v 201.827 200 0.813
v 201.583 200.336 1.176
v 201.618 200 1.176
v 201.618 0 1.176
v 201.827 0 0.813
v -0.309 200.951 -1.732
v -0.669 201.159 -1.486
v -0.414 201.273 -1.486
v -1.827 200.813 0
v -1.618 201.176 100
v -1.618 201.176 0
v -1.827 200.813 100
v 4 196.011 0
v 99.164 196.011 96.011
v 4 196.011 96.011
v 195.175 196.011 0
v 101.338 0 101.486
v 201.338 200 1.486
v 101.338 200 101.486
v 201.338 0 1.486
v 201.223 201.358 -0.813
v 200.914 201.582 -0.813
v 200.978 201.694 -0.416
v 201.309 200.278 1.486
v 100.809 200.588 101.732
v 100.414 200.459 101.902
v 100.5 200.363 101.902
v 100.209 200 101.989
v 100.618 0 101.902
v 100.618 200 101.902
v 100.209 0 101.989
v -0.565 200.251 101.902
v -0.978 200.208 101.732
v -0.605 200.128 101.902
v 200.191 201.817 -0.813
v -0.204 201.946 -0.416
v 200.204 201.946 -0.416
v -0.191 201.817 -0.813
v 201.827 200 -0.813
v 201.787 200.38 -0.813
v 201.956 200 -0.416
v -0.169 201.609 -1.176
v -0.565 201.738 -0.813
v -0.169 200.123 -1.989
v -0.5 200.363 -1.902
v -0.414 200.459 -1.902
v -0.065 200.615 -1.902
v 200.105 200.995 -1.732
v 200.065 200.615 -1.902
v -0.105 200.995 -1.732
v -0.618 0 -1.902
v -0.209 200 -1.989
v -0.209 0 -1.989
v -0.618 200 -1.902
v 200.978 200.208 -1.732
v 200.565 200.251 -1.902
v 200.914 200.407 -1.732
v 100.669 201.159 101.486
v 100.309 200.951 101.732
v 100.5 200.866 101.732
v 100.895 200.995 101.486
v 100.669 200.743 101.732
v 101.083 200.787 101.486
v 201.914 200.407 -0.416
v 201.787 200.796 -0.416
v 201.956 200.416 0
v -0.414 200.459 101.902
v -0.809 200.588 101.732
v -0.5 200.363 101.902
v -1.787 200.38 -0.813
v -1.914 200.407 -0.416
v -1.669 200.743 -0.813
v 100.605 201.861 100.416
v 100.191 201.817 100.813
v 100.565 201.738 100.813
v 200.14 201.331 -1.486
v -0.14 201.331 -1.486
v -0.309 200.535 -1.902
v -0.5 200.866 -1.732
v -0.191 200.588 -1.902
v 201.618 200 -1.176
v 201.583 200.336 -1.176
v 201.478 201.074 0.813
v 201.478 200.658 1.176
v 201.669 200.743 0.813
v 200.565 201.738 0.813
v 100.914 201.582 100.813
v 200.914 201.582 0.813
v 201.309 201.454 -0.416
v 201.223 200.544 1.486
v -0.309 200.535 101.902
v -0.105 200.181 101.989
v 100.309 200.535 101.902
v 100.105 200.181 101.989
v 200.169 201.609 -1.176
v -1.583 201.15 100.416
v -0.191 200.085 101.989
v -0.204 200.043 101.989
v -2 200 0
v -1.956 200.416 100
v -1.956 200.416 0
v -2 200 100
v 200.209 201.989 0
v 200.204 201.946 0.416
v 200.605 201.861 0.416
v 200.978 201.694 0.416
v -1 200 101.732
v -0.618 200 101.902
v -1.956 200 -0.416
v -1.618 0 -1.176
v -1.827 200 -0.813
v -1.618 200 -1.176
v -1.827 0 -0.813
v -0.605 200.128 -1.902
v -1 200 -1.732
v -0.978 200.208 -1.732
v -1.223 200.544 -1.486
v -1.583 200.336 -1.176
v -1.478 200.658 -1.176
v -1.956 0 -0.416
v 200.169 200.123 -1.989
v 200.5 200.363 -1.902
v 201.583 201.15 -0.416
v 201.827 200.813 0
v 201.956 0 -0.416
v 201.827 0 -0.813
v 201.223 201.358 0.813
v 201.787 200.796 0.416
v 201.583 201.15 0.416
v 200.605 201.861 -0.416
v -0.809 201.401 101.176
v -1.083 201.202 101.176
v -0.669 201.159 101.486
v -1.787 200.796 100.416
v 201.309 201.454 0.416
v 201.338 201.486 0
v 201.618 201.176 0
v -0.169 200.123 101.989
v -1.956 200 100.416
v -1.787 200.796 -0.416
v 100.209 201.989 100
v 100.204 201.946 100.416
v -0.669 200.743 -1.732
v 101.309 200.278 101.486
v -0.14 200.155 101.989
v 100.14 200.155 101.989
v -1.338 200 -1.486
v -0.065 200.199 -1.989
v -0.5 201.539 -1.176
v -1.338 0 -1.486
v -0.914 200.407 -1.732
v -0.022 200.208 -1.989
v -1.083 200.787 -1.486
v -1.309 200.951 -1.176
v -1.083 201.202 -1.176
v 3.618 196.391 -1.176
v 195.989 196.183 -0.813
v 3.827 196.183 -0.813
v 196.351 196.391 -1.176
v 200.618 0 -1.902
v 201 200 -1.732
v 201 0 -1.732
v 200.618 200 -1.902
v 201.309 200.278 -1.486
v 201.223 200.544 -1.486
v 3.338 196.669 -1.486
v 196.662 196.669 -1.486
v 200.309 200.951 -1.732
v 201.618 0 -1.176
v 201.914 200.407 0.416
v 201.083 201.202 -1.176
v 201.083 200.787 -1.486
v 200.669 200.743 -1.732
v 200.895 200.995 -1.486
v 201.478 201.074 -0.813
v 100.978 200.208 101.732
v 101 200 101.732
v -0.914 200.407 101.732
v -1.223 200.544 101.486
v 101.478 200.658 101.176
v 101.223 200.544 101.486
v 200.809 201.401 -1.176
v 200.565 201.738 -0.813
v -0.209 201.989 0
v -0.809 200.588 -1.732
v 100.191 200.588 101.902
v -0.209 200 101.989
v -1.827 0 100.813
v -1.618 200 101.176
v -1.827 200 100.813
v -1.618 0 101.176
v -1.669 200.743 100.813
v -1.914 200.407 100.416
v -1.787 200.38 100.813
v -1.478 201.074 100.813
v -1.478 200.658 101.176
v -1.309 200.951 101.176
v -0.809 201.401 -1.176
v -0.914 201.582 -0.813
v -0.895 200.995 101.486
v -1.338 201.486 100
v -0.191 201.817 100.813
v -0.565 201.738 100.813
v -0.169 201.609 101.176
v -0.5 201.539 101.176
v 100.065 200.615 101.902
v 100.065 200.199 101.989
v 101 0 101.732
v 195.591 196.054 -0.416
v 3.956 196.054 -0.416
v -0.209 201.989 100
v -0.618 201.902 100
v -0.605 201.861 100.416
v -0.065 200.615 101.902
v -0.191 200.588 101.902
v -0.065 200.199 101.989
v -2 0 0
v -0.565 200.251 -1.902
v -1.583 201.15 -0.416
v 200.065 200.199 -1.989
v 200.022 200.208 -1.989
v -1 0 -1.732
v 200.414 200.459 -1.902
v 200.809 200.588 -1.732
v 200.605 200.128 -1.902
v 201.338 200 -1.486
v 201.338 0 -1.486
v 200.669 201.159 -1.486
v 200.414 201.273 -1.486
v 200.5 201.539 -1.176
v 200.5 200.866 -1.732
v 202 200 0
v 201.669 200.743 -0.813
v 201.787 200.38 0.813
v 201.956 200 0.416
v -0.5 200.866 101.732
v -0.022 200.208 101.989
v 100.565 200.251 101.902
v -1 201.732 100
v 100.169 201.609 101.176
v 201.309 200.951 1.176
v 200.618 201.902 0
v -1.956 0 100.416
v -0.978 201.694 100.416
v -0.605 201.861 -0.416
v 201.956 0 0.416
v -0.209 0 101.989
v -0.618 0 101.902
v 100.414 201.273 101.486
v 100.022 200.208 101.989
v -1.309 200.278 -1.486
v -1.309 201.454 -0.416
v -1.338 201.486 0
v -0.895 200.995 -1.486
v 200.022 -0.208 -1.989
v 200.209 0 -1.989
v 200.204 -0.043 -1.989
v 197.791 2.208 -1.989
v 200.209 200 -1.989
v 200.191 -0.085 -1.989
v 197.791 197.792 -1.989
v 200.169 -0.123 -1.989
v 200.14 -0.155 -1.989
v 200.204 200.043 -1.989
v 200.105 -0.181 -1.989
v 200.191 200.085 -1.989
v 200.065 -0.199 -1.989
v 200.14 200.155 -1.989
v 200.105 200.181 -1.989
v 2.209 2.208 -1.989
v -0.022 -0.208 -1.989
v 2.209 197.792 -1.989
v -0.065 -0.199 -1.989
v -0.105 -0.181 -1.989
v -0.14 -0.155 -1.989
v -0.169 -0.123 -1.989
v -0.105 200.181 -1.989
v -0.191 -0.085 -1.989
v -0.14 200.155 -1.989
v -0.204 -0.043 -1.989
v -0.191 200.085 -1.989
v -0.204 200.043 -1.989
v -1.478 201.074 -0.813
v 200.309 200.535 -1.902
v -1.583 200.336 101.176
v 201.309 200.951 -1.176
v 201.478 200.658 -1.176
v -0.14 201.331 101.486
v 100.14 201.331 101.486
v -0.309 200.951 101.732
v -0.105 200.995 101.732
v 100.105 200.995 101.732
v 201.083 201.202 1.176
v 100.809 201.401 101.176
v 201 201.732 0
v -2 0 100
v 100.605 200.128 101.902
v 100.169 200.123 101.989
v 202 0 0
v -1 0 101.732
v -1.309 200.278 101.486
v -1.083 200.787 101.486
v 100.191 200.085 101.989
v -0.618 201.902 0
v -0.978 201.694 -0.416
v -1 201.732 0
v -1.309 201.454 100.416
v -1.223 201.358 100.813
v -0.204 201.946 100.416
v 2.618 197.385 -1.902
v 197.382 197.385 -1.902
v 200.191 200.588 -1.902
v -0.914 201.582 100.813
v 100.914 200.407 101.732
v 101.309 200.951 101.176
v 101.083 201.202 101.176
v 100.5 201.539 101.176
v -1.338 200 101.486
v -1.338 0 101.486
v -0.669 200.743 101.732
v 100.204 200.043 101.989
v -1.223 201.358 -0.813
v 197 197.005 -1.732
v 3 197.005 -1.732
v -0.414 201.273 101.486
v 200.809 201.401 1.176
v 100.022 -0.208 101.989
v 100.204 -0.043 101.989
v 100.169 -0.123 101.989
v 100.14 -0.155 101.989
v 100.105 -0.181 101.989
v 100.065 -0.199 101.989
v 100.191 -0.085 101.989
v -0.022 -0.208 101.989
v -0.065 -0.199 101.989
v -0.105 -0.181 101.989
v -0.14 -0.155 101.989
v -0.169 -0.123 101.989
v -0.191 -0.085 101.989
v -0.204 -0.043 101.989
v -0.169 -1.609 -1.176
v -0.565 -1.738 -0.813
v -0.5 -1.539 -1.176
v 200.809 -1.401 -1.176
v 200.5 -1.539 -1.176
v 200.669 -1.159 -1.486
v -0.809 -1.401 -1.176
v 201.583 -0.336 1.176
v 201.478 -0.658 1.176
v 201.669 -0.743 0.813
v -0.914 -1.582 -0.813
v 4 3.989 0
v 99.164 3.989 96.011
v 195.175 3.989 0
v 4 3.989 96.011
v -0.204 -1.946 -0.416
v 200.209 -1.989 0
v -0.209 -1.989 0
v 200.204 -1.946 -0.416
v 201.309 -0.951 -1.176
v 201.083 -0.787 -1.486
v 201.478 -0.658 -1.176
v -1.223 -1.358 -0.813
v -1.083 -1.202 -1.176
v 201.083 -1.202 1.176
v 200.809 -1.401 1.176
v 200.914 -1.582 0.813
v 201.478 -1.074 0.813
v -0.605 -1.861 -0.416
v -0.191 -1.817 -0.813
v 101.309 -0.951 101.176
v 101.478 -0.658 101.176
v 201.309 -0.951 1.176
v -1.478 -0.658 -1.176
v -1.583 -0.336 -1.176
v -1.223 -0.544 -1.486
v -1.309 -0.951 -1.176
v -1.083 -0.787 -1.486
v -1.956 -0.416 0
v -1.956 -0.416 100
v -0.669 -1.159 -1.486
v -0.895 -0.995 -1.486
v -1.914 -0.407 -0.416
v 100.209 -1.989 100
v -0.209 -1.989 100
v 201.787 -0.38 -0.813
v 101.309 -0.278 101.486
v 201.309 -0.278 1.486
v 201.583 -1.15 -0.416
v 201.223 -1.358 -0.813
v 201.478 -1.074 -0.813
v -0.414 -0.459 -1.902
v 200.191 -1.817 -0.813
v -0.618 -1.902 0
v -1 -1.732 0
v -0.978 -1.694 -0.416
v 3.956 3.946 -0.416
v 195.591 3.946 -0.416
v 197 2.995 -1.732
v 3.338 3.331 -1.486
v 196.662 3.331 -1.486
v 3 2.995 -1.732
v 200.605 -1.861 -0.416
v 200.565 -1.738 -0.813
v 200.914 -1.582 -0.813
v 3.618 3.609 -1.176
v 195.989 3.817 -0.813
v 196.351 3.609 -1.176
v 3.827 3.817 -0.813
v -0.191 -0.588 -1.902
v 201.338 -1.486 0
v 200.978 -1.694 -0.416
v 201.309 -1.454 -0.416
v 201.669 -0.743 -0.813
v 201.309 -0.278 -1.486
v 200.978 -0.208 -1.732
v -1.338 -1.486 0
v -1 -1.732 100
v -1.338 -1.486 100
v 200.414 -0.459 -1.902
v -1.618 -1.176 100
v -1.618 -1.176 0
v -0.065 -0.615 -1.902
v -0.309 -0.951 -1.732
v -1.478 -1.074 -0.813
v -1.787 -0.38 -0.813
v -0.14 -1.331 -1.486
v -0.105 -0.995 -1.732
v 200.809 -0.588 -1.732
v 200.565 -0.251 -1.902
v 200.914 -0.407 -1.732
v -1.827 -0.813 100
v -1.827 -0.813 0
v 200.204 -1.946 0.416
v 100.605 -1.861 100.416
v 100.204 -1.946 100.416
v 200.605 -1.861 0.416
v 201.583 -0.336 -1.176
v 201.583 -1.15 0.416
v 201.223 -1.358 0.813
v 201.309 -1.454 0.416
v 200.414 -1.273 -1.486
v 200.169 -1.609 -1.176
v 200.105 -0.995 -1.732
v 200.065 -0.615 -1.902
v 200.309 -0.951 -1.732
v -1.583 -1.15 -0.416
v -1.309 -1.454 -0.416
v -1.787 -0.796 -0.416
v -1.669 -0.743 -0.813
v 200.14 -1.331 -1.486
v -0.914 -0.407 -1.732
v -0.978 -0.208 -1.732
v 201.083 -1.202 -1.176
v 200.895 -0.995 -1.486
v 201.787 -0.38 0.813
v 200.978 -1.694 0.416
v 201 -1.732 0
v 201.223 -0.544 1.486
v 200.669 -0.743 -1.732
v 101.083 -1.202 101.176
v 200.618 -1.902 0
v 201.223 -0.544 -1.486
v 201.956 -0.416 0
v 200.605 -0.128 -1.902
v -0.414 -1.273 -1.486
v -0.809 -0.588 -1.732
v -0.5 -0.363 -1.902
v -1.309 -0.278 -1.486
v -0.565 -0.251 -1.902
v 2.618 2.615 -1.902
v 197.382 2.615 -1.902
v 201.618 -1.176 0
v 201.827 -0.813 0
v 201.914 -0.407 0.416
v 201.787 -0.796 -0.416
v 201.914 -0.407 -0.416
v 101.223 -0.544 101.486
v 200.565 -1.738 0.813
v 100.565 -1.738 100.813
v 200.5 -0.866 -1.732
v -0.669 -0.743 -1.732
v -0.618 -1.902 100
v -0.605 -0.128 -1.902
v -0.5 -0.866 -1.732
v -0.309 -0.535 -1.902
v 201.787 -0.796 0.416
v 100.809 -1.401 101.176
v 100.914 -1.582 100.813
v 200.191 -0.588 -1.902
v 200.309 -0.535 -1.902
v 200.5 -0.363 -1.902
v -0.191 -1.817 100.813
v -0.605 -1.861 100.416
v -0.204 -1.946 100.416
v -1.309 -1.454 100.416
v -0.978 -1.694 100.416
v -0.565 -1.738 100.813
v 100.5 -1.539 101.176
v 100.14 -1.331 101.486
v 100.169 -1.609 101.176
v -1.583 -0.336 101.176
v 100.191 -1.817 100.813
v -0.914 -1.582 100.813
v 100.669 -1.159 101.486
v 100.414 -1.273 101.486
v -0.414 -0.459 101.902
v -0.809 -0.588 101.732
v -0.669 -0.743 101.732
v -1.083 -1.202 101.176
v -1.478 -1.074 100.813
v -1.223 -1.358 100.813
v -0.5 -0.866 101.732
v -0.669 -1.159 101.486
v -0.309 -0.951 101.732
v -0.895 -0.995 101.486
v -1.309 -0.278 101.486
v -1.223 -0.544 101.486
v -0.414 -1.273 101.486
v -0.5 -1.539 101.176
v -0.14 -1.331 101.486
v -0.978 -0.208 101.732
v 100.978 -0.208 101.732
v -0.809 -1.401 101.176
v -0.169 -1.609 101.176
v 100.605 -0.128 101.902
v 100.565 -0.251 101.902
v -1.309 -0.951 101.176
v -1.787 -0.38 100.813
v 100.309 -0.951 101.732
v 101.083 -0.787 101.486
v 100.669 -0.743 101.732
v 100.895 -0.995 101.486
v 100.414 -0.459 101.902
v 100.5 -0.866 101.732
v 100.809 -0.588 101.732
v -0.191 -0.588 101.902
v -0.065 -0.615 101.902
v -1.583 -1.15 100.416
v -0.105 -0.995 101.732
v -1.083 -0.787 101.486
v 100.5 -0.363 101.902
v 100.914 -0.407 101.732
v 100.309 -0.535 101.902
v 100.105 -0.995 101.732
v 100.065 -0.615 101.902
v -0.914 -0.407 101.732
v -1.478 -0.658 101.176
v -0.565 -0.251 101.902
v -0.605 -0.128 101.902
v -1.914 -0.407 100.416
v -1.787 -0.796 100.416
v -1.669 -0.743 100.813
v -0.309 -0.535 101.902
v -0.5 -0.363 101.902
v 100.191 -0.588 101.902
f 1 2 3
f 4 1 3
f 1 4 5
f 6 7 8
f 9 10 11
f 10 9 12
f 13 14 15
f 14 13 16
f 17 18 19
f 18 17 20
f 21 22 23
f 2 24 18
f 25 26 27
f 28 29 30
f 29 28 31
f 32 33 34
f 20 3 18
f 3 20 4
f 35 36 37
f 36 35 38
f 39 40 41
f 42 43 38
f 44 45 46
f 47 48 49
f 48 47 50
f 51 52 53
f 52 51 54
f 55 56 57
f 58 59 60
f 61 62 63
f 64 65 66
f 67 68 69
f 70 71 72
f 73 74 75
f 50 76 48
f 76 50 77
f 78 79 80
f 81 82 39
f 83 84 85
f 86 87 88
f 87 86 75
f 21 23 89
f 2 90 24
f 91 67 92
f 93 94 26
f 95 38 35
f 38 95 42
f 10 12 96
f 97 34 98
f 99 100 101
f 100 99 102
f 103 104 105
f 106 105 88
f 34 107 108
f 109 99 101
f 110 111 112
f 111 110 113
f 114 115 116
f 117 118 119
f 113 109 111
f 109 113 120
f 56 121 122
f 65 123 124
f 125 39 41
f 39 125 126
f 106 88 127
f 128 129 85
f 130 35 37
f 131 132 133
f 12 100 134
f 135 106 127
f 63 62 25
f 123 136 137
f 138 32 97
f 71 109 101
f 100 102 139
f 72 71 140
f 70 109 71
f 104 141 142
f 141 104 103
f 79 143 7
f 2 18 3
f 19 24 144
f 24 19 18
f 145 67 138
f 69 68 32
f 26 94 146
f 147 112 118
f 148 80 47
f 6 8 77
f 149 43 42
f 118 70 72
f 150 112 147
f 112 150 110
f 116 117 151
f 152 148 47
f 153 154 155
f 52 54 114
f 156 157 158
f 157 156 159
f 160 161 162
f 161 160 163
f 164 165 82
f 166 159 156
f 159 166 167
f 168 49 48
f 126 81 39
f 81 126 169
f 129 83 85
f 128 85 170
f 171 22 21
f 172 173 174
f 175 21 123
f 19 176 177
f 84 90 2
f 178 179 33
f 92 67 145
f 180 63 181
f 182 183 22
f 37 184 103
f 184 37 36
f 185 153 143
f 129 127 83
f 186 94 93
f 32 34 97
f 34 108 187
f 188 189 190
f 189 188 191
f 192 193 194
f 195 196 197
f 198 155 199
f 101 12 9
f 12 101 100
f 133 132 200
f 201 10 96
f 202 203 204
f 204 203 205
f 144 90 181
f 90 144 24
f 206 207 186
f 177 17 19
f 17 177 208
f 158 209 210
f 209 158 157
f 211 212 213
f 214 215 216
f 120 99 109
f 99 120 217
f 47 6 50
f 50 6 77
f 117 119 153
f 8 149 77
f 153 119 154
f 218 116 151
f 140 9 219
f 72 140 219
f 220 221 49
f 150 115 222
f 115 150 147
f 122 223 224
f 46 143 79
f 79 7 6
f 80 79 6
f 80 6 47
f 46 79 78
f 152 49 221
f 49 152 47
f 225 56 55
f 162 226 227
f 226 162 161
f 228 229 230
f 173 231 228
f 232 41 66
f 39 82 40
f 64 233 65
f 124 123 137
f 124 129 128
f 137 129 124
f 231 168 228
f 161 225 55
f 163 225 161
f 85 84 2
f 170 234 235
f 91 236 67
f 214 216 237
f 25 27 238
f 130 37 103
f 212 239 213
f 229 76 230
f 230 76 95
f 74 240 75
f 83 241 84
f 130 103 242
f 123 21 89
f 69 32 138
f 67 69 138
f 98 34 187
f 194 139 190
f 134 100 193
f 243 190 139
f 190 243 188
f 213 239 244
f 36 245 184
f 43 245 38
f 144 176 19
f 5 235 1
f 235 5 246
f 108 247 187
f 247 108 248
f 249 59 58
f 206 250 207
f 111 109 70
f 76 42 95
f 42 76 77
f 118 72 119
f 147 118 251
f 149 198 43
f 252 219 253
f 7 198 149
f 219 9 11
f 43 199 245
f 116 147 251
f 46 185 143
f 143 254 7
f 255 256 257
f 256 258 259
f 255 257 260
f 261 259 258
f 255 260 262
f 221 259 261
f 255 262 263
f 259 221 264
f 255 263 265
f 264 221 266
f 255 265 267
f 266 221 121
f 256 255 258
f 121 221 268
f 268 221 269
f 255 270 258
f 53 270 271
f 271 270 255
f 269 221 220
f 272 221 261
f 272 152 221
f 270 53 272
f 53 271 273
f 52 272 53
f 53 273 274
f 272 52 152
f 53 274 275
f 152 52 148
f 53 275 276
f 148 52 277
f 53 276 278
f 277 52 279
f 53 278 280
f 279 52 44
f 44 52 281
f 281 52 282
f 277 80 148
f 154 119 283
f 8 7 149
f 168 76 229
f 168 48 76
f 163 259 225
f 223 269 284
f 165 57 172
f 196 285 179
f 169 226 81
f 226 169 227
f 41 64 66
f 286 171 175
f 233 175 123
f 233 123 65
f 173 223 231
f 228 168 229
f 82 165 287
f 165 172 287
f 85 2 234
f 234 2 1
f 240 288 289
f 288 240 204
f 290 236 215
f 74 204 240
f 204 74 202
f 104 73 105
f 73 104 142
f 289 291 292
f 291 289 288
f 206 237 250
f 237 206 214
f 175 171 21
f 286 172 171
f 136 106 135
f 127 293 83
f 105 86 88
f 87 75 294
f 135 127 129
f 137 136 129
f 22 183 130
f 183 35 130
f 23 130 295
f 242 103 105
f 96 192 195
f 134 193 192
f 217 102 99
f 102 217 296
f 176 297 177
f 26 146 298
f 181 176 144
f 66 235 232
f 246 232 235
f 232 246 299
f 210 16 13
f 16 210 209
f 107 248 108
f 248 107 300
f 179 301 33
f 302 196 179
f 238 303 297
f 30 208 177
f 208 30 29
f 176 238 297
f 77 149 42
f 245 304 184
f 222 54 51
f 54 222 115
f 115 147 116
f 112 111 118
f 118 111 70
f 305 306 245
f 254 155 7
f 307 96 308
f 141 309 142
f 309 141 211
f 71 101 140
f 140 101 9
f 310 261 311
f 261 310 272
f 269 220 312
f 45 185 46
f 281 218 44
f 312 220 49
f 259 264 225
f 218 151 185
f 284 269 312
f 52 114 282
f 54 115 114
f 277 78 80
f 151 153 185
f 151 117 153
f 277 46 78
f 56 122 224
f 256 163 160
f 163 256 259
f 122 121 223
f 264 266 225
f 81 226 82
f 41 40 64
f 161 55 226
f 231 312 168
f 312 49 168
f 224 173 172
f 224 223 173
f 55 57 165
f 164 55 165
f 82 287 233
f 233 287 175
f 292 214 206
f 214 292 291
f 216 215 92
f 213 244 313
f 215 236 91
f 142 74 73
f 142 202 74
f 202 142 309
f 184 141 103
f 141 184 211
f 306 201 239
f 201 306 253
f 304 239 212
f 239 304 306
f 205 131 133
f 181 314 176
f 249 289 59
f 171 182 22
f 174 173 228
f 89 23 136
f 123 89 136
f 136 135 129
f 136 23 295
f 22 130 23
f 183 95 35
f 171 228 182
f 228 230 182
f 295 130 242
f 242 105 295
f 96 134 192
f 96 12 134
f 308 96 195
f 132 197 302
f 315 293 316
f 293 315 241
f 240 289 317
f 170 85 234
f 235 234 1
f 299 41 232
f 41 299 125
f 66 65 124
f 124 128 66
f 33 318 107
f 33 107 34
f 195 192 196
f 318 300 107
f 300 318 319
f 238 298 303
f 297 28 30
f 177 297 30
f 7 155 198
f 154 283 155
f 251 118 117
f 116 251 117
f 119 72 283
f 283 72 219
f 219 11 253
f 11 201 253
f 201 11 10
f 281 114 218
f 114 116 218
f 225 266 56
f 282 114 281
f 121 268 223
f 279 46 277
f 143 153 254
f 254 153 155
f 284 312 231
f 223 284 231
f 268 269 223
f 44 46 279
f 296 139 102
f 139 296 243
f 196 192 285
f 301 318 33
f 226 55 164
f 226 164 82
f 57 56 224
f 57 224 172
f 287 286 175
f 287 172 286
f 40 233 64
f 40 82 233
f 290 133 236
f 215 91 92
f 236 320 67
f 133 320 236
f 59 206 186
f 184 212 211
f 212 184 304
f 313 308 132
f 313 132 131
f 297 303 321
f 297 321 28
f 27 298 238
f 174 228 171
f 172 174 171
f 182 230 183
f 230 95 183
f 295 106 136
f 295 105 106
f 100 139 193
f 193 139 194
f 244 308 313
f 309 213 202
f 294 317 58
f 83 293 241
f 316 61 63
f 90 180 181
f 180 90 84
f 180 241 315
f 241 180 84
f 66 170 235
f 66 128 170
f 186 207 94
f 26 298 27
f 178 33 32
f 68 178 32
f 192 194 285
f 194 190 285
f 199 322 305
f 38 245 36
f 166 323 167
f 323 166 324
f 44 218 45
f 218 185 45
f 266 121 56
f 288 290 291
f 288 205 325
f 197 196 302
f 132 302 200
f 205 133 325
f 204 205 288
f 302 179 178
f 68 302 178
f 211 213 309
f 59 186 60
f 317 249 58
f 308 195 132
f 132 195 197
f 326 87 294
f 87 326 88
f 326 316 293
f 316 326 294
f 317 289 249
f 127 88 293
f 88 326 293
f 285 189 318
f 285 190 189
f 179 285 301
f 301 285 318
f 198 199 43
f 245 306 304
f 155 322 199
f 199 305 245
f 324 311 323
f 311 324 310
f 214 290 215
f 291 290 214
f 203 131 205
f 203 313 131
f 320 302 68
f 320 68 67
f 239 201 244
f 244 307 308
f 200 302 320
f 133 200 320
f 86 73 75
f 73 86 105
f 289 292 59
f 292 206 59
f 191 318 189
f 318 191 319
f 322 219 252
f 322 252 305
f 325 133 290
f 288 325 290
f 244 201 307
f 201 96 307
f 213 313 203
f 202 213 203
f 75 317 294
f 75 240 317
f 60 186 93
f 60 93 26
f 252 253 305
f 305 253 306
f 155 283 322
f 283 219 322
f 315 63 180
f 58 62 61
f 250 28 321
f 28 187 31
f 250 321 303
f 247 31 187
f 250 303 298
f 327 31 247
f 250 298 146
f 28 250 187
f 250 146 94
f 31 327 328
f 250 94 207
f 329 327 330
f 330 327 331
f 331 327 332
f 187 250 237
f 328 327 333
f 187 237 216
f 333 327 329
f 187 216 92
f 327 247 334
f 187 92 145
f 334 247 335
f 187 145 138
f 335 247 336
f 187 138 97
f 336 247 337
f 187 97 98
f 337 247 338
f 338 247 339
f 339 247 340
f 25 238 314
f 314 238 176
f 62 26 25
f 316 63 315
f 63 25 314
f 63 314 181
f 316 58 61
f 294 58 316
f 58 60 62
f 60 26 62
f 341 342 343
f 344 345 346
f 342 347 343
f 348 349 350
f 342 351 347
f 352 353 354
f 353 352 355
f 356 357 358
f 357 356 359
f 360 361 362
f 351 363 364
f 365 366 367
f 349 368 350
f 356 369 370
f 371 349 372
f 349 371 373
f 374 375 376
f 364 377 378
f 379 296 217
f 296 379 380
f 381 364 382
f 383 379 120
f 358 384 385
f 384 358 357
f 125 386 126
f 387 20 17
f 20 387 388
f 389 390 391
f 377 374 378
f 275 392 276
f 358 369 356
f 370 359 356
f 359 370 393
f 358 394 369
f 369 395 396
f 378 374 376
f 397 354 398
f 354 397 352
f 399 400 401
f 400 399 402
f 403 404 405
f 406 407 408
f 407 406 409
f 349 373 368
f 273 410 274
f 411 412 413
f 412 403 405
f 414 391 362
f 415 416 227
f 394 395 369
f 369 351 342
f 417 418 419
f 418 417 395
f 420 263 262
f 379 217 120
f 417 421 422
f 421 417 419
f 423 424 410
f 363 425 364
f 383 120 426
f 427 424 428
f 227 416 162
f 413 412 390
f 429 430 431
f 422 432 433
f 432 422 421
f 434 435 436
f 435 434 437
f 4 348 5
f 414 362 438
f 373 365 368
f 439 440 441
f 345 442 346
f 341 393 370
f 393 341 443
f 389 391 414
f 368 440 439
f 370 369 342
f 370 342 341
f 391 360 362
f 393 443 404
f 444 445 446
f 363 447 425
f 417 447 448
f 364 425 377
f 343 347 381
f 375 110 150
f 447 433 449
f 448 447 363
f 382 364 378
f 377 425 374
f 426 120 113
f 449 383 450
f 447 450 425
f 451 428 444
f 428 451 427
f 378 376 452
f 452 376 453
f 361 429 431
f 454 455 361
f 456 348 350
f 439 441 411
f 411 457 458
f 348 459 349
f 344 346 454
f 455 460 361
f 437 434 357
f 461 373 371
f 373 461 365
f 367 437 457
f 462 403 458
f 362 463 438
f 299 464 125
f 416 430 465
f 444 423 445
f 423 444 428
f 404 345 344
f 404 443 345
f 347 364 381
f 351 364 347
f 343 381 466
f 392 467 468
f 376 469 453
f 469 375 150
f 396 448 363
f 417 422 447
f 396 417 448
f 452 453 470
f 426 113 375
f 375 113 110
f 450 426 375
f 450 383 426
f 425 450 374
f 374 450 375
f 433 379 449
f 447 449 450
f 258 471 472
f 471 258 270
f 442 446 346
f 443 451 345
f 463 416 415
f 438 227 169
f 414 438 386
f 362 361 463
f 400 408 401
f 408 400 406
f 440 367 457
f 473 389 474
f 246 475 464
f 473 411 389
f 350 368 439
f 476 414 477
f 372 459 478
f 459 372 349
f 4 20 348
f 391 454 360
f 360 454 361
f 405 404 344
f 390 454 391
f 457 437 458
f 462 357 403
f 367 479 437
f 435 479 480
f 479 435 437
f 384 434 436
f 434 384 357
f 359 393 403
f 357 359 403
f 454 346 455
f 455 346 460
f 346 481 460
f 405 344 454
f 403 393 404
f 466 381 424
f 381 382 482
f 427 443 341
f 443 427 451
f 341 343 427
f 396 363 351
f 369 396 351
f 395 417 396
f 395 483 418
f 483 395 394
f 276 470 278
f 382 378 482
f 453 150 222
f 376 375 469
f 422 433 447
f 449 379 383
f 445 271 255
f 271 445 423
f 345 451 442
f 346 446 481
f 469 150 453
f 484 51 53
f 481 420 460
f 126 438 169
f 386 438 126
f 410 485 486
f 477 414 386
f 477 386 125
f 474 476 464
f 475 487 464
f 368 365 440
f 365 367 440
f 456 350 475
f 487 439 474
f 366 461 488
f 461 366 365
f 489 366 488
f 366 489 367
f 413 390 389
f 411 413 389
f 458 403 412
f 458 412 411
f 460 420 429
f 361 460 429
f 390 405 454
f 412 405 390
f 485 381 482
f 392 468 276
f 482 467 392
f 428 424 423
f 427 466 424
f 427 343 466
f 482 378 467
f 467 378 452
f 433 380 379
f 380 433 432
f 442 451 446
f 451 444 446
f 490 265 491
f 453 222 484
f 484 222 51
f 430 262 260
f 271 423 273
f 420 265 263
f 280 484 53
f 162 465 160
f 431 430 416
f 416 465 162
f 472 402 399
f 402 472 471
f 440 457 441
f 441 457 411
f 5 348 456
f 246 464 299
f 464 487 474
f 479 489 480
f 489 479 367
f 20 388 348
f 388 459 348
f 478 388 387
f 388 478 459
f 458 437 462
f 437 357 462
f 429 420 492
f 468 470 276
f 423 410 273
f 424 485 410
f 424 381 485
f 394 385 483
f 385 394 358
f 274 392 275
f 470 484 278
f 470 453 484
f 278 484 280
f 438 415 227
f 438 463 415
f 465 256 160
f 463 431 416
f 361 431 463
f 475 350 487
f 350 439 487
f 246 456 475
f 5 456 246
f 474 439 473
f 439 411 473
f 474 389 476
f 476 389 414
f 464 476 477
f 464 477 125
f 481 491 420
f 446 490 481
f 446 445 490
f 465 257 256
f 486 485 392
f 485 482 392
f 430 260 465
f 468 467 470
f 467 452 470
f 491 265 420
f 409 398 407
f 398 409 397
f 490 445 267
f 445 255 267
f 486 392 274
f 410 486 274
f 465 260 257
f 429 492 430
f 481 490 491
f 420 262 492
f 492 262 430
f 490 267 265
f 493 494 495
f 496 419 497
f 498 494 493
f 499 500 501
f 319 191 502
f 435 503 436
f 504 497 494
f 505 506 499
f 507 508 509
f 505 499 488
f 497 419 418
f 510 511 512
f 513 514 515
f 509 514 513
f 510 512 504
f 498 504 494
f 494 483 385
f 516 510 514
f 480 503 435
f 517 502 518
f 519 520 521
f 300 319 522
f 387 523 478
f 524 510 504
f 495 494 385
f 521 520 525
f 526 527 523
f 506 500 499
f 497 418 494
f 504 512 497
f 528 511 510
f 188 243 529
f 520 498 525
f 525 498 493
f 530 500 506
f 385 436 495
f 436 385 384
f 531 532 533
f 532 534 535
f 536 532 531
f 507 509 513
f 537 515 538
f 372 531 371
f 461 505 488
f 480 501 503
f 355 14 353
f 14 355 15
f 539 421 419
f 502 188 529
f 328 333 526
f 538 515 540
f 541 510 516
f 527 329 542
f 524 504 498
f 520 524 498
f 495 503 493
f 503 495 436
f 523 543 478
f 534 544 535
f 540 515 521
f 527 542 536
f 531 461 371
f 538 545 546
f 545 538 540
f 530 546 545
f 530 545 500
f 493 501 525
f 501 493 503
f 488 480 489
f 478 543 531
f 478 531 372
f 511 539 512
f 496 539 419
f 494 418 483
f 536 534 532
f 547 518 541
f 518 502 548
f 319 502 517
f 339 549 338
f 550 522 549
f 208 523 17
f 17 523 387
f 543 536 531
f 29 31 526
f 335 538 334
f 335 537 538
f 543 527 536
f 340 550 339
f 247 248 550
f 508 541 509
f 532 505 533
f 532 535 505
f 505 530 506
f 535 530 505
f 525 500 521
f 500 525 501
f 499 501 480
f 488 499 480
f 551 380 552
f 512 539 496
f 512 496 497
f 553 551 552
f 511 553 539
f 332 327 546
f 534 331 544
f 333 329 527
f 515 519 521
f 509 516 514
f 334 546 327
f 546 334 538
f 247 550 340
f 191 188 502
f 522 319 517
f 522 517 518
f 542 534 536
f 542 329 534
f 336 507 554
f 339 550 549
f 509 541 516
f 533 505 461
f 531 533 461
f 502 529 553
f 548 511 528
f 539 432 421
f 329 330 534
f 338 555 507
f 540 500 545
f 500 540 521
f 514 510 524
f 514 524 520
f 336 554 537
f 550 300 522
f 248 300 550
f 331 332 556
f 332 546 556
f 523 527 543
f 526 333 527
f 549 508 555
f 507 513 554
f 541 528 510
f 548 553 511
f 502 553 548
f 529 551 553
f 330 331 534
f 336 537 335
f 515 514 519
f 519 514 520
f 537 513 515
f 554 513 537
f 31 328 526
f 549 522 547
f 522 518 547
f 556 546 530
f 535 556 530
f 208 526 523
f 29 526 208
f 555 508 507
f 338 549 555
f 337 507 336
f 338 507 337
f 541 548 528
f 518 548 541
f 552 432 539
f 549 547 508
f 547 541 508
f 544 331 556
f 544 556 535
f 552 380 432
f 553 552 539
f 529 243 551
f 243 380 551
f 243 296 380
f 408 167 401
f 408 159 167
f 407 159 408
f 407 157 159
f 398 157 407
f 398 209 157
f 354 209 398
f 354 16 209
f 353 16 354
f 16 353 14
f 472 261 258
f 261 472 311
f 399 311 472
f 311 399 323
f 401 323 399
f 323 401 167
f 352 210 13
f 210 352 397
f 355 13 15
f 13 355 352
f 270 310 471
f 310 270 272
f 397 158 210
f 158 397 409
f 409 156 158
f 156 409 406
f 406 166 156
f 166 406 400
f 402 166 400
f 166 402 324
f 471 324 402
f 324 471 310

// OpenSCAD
// Define the dimensions of the case
$fn=30;
len = 100; // Length of the case
wid = 200; // Width of the case
dep = 100; // Depth of the case
wall = 3; // Thickness of the walls

module triangle_prism(b, d, h, ht) {
    linear_extrude(height = ht, scale = 1)
    polygon(points = [[0, 0], [b, 0], [d, h]]);
}

// Create the case
module case(len, wid, dep, wall) {
    minkowski_sphere_radius = 1;
    wall = wall - minkowski_sphere_radius;
    minkowski() {
        union() {
            difference() {
                translate([len, wid, 0])
                    rotate([90,0,0])
                        triangle_prism(100,0,100,wid);
                translate([len - wall, wid - wall, 0])
                    rotate([90,0,0])
                        triangle_prism(100,0,100,wid-2*wall);
            }
            difference() {
                cube([len, wid, dep]); // Outer box
                translate([wall, wall, 0])
                    cube([len -  wall, wid - 2 * wall, dep - wall]); // Inner box
            }
        }
        sphere(2 * minkowski_sphere_radius);
    }
}

case(len, wid, dep, wall);
